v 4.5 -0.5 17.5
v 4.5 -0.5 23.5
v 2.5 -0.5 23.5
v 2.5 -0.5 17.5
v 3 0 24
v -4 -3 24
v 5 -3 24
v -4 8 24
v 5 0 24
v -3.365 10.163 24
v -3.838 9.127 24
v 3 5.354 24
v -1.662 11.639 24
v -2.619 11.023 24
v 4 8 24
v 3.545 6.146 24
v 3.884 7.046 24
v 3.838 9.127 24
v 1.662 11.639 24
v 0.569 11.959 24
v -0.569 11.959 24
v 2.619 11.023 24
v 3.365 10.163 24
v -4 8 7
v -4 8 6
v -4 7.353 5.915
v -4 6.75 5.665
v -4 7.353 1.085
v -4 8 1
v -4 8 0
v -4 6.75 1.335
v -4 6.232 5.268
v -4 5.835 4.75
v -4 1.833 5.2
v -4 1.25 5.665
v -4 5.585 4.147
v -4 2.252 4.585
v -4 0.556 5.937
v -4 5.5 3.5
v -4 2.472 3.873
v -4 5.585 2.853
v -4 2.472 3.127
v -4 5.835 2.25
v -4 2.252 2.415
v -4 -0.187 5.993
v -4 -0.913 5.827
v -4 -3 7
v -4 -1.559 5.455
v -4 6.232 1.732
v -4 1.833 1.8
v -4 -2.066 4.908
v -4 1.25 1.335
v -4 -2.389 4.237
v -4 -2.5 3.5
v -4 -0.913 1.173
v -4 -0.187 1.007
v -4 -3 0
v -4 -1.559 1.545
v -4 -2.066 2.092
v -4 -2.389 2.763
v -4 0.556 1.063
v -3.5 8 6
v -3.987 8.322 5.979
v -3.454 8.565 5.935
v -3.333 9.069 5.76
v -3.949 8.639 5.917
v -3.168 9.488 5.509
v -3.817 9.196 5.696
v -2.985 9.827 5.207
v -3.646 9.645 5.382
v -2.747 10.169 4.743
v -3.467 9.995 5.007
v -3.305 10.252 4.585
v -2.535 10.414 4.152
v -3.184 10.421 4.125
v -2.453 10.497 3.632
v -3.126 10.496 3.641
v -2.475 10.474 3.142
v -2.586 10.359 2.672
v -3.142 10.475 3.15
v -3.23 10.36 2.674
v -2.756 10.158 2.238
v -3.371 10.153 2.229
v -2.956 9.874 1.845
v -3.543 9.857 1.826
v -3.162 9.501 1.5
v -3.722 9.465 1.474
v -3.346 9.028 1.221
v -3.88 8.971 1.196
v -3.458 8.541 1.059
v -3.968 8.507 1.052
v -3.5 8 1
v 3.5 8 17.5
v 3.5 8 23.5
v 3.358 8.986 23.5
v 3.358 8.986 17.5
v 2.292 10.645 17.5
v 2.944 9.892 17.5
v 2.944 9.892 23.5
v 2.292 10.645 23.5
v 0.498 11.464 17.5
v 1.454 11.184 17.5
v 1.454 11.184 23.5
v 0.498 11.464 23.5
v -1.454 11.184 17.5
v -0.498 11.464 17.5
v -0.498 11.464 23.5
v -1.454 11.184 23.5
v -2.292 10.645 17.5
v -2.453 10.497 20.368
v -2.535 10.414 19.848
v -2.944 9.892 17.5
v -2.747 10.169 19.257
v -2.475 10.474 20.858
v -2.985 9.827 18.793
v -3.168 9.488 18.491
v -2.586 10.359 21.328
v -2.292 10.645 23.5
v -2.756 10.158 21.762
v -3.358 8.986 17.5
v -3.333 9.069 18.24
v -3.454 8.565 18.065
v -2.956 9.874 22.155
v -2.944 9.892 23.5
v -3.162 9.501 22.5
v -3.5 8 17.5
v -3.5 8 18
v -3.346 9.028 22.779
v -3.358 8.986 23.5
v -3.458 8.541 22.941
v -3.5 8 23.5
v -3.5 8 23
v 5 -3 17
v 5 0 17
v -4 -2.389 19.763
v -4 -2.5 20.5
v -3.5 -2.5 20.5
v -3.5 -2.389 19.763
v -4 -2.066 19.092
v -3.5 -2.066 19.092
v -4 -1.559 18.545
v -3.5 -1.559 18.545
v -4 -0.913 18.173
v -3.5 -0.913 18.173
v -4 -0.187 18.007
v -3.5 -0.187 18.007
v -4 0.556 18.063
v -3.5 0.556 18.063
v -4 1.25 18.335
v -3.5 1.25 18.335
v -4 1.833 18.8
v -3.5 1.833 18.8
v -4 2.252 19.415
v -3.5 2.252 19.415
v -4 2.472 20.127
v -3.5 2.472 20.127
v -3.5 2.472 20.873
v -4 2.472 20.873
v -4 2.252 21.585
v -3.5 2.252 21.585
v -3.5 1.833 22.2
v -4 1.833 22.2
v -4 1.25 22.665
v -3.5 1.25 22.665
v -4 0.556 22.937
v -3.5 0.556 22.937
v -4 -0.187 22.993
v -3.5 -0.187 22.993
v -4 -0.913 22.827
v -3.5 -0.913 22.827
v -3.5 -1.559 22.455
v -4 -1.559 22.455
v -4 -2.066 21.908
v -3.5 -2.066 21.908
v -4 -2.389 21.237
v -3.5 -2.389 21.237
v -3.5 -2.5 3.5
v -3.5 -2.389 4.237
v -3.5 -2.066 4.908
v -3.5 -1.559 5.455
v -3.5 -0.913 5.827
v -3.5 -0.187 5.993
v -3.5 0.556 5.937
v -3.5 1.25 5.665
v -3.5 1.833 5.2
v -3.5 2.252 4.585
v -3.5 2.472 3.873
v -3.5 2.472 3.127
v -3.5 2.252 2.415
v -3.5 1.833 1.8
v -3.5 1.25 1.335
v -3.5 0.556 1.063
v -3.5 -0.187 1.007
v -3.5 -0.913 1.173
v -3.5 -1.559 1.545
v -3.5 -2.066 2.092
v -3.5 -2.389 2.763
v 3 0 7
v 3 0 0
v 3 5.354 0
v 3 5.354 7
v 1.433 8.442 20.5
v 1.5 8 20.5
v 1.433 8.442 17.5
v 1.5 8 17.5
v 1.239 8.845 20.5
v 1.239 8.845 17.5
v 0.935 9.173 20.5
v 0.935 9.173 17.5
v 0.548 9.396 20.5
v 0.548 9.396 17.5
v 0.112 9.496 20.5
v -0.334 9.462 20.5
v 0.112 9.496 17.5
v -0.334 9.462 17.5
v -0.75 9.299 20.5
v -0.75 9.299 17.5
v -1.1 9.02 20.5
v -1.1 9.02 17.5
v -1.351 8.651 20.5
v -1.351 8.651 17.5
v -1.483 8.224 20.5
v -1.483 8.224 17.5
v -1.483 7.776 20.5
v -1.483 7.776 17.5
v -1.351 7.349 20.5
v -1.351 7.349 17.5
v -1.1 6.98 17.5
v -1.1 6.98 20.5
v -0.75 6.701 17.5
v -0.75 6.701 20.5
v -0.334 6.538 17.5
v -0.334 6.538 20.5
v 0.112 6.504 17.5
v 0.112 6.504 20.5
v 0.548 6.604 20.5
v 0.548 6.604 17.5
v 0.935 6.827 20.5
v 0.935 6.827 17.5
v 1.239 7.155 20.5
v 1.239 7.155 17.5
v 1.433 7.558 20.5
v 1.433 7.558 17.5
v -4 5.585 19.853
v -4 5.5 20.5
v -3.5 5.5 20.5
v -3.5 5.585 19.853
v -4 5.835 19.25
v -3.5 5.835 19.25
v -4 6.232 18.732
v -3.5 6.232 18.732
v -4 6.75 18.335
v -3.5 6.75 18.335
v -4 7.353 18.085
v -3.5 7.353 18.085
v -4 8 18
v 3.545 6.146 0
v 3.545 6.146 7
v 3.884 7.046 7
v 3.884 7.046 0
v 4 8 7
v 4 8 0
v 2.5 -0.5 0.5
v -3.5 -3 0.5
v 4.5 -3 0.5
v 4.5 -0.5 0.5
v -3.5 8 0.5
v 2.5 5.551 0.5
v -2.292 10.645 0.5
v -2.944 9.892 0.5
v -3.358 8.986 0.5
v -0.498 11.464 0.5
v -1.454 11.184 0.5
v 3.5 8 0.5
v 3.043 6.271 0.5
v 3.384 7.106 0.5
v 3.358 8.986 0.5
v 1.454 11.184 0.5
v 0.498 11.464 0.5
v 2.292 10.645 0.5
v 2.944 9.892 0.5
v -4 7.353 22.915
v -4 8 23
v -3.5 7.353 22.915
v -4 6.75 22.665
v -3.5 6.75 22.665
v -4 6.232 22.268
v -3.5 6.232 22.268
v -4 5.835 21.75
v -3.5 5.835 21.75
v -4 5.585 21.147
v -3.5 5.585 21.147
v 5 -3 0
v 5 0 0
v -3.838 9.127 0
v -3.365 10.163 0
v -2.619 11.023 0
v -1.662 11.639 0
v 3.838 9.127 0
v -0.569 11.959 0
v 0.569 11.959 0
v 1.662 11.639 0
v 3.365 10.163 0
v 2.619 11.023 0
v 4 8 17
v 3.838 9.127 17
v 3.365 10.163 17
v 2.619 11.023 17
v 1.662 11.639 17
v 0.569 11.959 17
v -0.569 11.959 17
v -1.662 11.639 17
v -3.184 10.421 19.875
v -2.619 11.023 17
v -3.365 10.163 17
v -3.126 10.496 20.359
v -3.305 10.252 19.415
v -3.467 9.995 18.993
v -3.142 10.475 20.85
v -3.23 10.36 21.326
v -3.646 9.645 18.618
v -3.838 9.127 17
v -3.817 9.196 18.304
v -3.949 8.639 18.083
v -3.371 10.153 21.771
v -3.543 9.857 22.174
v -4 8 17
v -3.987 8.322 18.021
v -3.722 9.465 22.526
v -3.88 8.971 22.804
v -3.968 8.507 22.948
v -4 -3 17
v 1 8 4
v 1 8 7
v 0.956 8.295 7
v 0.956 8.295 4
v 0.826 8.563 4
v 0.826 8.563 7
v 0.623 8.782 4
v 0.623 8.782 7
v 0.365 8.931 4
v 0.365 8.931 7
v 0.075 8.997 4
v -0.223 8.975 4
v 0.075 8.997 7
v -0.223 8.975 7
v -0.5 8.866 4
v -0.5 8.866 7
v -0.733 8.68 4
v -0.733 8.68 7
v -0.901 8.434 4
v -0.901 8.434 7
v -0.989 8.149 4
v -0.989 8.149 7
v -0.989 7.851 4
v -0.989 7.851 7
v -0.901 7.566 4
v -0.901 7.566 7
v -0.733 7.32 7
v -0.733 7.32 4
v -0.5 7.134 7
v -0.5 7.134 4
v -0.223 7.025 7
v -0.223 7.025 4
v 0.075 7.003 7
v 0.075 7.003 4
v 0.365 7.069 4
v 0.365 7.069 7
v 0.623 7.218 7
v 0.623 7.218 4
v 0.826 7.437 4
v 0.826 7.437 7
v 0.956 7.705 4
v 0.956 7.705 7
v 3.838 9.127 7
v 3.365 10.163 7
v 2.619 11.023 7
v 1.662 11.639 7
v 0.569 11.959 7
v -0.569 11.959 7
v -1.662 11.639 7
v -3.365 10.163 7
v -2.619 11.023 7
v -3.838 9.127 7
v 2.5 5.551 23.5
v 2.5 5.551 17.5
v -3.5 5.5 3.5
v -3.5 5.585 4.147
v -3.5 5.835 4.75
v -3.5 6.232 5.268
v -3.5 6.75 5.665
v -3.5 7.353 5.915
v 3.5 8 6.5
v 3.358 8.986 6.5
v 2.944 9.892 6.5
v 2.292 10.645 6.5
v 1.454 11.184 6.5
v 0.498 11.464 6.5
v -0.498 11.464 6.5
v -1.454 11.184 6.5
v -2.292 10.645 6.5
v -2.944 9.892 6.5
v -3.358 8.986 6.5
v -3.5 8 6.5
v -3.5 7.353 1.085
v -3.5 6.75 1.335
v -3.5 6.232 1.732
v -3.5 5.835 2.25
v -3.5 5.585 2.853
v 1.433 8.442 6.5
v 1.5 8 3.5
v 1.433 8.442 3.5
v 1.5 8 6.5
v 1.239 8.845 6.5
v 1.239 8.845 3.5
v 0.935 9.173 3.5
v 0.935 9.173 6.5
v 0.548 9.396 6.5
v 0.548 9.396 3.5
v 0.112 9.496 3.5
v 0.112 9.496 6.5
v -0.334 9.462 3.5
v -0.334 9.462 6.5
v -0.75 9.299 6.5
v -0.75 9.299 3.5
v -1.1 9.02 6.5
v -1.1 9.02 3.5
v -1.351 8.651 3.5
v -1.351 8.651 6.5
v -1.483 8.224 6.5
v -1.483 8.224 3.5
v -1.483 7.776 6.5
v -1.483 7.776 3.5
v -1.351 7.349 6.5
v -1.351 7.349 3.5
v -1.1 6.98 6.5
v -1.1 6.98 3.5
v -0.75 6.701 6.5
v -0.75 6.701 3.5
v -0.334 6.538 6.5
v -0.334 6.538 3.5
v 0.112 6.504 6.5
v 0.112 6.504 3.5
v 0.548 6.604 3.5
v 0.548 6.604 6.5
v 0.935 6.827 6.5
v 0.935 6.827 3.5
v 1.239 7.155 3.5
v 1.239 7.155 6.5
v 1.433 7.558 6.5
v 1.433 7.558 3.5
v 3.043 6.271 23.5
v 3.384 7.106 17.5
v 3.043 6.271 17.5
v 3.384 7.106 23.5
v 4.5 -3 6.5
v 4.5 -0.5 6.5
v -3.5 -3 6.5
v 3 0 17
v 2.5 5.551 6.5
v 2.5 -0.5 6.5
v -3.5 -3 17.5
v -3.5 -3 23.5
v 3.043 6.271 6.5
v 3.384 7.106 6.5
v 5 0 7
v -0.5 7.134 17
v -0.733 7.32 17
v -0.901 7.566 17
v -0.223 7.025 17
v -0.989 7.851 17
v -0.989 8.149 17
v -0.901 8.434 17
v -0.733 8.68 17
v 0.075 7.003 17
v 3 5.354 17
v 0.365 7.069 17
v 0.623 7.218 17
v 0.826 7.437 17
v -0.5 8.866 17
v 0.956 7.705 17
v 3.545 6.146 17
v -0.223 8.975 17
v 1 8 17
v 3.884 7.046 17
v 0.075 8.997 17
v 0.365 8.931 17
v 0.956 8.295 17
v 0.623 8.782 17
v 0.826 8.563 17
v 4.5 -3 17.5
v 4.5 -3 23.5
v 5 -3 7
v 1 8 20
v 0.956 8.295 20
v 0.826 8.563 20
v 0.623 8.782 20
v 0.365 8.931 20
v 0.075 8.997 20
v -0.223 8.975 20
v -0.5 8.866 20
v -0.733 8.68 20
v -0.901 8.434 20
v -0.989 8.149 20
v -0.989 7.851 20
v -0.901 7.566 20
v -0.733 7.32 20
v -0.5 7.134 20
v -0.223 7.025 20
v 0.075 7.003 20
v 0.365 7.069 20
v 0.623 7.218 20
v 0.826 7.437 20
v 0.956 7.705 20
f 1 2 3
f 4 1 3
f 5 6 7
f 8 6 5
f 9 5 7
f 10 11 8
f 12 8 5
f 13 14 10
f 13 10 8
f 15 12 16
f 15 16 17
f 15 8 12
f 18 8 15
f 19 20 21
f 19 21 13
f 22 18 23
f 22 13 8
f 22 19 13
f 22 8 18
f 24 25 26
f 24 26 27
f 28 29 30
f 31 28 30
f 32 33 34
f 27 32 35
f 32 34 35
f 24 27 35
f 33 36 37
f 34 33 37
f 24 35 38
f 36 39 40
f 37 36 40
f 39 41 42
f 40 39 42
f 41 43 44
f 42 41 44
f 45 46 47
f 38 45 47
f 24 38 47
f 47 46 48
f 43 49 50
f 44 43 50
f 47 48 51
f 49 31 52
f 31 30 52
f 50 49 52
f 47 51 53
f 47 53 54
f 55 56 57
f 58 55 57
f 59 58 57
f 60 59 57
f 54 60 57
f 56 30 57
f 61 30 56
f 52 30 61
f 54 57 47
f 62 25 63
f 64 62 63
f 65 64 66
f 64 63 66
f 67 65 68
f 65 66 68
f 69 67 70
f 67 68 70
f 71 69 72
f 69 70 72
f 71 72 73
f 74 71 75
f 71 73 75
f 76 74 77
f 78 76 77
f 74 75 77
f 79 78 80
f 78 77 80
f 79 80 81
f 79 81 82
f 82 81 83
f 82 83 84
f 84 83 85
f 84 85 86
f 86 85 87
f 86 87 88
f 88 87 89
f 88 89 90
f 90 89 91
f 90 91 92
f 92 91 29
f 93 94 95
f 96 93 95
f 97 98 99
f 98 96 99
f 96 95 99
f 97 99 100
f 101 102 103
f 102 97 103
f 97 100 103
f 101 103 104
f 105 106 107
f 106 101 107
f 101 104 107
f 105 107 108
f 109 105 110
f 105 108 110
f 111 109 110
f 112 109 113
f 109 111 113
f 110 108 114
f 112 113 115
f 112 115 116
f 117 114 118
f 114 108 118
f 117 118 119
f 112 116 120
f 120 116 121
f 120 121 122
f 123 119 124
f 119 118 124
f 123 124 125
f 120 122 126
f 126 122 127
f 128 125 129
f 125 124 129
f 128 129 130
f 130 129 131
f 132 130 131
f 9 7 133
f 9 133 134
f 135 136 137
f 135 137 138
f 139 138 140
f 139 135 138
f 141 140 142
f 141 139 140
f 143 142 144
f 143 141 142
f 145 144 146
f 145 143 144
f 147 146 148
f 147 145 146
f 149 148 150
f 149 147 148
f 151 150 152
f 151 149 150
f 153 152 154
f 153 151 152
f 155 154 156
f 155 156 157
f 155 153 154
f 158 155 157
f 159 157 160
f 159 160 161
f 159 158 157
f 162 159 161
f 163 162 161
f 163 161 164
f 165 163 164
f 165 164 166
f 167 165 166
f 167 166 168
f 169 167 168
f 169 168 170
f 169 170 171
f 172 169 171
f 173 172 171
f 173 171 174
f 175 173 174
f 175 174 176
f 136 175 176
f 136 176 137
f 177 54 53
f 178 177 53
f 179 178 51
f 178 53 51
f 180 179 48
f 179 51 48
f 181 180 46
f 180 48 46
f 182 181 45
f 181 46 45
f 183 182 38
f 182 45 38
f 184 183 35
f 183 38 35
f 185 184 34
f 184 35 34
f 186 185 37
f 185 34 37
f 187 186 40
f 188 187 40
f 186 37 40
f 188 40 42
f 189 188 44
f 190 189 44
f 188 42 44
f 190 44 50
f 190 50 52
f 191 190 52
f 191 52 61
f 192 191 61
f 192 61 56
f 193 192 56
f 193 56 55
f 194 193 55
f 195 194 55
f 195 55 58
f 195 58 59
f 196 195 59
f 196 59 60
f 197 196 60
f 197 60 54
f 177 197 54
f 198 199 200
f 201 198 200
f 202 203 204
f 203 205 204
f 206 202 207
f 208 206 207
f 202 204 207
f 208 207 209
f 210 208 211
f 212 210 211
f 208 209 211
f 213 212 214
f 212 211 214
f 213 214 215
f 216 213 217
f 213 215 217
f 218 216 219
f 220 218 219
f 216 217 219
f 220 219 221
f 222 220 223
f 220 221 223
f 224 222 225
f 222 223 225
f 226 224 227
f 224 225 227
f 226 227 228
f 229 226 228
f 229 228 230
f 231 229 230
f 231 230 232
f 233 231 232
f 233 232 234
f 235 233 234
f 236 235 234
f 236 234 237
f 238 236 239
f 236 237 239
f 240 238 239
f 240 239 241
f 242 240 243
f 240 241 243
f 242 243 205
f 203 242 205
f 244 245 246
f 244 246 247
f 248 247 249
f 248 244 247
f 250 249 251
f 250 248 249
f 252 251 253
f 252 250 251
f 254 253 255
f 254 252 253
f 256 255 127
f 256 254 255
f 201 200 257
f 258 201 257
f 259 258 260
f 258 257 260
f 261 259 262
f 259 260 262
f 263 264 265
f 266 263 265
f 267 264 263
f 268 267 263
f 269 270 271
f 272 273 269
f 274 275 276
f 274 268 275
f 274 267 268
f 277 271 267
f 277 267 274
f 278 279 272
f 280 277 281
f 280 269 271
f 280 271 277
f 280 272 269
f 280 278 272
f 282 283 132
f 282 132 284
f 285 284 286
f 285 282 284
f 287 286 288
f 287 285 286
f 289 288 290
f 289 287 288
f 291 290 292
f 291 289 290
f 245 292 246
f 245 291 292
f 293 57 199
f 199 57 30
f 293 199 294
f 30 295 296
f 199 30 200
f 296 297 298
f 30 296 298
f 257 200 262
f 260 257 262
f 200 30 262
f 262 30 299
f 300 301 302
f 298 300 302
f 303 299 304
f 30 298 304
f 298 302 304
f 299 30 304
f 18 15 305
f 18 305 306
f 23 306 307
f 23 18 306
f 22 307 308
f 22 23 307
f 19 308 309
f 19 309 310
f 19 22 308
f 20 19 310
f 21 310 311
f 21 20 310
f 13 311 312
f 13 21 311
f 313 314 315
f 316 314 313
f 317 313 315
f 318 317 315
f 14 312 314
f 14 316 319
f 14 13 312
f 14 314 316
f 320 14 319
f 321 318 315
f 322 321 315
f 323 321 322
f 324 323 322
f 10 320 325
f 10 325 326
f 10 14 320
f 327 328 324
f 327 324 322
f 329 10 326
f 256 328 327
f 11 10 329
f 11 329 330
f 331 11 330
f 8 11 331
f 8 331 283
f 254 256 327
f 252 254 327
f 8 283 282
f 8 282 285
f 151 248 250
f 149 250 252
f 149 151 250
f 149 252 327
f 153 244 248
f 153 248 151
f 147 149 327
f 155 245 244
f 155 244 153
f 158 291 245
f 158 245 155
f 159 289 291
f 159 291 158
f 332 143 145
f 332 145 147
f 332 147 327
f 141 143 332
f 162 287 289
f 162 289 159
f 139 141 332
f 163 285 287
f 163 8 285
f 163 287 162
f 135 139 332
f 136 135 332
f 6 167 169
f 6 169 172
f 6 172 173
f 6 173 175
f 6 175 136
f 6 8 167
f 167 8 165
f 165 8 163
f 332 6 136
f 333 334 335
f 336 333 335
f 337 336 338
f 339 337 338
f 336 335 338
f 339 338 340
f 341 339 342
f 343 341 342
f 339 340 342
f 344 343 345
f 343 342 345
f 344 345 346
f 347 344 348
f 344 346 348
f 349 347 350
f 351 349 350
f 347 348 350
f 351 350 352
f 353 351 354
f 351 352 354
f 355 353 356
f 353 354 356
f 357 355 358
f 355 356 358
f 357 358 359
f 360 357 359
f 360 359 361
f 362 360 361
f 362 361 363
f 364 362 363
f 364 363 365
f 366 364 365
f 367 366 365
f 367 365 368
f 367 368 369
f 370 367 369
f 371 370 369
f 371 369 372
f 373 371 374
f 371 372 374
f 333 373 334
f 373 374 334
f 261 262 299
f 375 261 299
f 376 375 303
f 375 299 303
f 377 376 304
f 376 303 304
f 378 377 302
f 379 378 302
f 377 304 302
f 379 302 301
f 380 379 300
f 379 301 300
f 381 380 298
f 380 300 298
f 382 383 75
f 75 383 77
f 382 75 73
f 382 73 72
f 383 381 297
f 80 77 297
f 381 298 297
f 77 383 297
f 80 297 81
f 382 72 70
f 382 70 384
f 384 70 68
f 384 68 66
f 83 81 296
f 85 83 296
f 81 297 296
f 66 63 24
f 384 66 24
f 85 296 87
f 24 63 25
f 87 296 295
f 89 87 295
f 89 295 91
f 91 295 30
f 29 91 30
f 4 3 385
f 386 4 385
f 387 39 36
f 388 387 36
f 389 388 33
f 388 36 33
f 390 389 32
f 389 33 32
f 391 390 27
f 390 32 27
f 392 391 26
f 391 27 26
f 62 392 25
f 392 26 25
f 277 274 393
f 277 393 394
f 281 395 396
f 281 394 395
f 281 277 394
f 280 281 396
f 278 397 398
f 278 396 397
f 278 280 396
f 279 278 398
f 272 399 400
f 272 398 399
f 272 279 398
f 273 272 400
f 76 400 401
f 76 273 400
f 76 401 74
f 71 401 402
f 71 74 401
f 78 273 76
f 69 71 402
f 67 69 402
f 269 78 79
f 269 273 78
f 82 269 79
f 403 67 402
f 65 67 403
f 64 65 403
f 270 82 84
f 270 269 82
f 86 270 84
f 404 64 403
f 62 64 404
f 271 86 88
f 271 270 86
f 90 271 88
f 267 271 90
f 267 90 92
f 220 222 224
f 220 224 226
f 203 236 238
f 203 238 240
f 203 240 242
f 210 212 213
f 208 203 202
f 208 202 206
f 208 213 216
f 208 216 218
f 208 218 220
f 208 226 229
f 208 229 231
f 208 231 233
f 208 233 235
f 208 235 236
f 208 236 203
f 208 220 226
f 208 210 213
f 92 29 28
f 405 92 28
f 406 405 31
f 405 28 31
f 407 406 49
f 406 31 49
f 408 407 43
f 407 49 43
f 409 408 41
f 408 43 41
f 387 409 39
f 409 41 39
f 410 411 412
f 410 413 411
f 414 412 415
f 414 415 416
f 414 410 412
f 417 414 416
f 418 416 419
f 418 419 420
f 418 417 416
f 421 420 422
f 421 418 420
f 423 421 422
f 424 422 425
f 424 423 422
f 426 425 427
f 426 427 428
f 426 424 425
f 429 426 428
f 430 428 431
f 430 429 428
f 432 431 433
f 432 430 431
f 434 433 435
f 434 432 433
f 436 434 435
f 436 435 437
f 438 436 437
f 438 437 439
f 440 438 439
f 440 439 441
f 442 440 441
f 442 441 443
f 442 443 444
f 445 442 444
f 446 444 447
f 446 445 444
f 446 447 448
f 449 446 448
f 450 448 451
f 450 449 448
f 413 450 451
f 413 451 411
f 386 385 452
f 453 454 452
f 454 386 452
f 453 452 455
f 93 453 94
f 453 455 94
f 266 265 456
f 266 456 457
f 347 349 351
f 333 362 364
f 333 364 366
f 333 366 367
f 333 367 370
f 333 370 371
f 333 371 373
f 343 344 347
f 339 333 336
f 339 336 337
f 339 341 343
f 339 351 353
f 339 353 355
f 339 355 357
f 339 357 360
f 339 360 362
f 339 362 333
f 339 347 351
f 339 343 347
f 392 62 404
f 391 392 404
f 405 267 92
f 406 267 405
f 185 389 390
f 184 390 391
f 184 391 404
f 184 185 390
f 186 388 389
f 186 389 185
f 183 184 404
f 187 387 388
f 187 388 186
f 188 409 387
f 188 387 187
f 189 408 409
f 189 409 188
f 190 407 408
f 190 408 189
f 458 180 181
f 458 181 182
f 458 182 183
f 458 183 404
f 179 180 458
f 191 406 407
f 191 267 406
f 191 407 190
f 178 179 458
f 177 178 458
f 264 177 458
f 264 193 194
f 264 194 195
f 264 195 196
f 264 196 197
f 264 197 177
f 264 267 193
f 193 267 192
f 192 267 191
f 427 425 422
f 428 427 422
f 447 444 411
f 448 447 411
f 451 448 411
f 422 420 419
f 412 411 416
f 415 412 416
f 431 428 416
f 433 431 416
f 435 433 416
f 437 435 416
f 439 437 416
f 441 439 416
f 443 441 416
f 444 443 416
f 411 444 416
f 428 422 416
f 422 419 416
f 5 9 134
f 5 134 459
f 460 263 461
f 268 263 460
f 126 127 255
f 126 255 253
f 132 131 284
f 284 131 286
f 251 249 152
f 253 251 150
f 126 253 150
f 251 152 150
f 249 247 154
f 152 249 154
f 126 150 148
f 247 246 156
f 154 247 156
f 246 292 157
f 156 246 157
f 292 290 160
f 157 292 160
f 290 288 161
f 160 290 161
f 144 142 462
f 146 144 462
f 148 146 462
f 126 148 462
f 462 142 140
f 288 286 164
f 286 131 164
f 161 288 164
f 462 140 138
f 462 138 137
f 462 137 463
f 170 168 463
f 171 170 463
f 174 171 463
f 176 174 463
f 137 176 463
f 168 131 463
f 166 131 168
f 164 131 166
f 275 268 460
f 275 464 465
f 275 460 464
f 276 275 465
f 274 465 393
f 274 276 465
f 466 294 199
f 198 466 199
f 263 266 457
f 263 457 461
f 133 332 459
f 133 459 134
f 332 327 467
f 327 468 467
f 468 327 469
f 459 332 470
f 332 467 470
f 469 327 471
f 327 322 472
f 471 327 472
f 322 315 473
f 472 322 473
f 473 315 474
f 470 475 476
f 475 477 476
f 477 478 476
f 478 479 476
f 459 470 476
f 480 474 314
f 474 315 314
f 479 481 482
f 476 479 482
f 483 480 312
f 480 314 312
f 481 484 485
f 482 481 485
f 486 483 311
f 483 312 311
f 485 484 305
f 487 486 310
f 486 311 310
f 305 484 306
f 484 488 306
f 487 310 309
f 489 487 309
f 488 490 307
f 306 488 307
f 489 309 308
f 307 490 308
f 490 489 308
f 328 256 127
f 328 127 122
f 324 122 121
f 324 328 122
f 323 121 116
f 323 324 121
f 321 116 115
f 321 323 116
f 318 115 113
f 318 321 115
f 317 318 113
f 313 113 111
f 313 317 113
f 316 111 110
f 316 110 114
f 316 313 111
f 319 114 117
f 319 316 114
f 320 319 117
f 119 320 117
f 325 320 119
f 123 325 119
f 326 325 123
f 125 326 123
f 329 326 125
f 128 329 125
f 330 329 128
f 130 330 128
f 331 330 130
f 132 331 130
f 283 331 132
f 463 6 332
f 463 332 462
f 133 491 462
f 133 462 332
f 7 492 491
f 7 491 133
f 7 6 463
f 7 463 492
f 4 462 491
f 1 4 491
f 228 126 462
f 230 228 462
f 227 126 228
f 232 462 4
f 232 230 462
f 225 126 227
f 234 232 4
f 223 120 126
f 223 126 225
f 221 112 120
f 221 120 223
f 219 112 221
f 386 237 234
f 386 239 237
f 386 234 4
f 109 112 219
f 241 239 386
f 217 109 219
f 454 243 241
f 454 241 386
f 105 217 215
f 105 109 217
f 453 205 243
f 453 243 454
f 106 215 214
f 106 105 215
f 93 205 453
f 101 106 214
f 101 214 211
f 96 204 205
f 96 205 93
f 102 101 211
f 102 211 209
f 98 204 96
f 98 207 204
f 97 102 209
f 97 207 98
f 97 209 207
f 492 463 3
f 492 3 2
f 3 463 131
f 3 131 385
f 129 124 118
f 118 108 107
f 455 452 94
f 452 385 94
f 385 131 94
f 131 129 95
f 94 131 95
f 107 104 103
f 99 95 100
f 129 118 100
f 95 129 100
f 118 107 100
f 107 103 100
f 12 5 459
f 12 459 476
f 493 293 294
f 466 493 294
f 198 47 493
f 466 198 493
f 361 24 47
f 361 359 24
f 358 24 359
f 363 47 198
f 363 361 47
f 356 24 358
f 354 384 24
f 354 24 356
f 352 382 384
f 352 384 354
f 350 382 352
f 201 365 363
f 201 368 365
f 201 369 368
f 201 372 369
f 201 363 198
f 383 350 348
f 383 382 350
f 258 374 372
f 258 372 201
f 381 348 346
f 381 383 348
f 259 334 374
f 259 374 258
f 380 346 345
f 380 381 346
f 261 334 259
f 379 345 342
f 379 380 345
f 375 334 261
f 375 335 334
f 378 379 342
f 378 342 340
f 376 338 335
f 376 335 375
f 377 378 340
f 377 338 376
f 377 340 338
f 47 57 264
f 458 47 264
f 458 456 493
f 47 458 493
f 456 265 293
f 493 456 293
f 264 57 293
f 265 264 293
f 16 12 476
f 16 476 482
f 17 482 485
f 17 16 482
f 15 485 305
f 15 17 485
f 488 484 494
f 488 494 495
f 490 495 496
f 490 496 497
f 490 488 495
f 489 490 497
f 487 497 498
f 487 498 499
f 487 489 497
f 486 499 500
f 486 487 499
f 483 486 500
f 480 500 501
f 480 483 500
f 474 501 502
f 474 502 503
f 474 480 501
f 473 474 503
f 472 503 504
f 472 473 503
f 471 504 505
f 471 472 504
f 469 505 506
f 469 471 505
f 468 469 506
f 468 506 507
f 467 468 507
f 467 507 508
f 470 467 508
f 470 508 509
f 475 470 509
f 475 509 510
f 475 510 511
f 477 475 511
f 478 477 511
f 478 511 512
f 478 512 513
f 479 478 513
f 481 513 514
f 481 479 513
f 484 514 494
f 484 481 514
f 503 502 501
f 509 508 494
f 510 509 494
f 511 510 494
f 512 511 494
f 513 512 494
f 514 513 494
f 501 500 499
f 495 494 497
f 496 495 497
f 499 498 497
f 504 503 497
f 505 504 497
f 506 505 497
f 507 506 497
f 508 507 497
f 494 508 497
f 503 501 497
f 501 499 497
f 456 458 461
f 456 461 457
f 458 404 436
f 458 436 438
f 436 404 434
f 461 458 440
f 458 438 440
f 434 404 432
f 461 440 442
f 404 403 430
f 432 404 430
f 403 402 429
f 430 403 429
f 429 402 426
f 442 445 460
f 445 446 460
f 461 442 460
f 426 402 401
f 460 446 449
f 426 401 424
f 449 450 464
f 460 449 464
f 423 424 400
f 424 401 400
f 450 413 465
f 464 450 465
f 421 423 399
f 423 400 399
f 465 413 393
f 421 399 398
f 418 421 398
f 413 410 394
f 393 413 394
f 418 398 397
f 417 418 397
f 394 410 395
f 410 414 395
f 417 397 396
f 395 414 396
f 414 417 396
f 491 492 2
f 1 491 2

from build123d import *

# Parameters (mm, degrees)
F1_DEPTH = 7
F2_R     = 1
F3_DEPTH = 3
F4_T     = -0.5
F5_R     = 2.5
F6_DEPTH = 2


with BuildPart() as f1:
    # F0 (on Top) → F1 (new body)
    with BuildSketch(Plane.XY):
        with BuildLine():
            ThreePointArc((-4, 8), (-1.4142135624, 4.2583426132), (3, 5.3542486889))
            ThreePointArc((3, 5.3542486889), (3.7416573868, 6.5857864376), (4, 8))
            ThreePointArc((4, 8), (0, 12), (-4, 8))
        make_face()
        with BuildLine():
            Line((5, 0), (3, 0))
            Line((3, 0), (3, 5.3542486889))
            ThreePointArc((3, 5.3542486889), (-1.4142135624, 4.2583426132), (-4, 8))
            Line((-4, 8), (-4, -3))
            Line((-4, -3), (5, -3))
            Line((5, -3), (5, 0))
        make_face()
    extrude(amount=F1_DEPTH)

    # F2 (on face) → F3 (cut)
    with BuildSketch(Plane.XY.offset(7)):
        with Locations((0, 8)):
            Circle(F2_R)
    extrude(amount=-F3_DEPTH, mode=Mode.SUBTRACT)

    # F4
    f4_openings = [f1.faces().sort_by_distance(p)[0] for p in [
        (0.5, -3, 3.5),
    ]]
    offset(amount=F4_T, openings=f4_openings, kind=Kind.INTERSECTION)

    # F5 (on face) → F6 (cut)
    with BuildSketch(Plane(origin=(-4, 0, 0), x_dir=(0, -1, 0), z_dir=(-1, 0, 0))):
        with BuildLine():
            ThreePointArc((-8, 1), (-6.232233047, 1.732233047), (-5.5, 3.5))
            ThreePointArc((-5.5, 3.5), (-6.232233047, 5.267766953), (-8, 6))
            Line((-8, 6), (-8, 1))
        make_face()
        with BuildLine():
            Line((-8, 1), (-8, 6))
            ThreePointArc((-8, 6), (-10.5, 3.5), (-8, 1))
        make_face()
        with Locations((0, 3.5)):
            Circle(F5_R)
    extrude(amount=-F6_DEPTH, mode=Mode.SUBTRACT)


with BuildPart() as f8_1:
    # F8: instance of F1
    add(f1.part.mirror(Plane(origin=(-0.0779610261, 3.8834403375, 12), x_dir=(1, 0, 0), z_dir=(0, 0, 1))))


solid = Compound([f1.part, f8_1.part])
